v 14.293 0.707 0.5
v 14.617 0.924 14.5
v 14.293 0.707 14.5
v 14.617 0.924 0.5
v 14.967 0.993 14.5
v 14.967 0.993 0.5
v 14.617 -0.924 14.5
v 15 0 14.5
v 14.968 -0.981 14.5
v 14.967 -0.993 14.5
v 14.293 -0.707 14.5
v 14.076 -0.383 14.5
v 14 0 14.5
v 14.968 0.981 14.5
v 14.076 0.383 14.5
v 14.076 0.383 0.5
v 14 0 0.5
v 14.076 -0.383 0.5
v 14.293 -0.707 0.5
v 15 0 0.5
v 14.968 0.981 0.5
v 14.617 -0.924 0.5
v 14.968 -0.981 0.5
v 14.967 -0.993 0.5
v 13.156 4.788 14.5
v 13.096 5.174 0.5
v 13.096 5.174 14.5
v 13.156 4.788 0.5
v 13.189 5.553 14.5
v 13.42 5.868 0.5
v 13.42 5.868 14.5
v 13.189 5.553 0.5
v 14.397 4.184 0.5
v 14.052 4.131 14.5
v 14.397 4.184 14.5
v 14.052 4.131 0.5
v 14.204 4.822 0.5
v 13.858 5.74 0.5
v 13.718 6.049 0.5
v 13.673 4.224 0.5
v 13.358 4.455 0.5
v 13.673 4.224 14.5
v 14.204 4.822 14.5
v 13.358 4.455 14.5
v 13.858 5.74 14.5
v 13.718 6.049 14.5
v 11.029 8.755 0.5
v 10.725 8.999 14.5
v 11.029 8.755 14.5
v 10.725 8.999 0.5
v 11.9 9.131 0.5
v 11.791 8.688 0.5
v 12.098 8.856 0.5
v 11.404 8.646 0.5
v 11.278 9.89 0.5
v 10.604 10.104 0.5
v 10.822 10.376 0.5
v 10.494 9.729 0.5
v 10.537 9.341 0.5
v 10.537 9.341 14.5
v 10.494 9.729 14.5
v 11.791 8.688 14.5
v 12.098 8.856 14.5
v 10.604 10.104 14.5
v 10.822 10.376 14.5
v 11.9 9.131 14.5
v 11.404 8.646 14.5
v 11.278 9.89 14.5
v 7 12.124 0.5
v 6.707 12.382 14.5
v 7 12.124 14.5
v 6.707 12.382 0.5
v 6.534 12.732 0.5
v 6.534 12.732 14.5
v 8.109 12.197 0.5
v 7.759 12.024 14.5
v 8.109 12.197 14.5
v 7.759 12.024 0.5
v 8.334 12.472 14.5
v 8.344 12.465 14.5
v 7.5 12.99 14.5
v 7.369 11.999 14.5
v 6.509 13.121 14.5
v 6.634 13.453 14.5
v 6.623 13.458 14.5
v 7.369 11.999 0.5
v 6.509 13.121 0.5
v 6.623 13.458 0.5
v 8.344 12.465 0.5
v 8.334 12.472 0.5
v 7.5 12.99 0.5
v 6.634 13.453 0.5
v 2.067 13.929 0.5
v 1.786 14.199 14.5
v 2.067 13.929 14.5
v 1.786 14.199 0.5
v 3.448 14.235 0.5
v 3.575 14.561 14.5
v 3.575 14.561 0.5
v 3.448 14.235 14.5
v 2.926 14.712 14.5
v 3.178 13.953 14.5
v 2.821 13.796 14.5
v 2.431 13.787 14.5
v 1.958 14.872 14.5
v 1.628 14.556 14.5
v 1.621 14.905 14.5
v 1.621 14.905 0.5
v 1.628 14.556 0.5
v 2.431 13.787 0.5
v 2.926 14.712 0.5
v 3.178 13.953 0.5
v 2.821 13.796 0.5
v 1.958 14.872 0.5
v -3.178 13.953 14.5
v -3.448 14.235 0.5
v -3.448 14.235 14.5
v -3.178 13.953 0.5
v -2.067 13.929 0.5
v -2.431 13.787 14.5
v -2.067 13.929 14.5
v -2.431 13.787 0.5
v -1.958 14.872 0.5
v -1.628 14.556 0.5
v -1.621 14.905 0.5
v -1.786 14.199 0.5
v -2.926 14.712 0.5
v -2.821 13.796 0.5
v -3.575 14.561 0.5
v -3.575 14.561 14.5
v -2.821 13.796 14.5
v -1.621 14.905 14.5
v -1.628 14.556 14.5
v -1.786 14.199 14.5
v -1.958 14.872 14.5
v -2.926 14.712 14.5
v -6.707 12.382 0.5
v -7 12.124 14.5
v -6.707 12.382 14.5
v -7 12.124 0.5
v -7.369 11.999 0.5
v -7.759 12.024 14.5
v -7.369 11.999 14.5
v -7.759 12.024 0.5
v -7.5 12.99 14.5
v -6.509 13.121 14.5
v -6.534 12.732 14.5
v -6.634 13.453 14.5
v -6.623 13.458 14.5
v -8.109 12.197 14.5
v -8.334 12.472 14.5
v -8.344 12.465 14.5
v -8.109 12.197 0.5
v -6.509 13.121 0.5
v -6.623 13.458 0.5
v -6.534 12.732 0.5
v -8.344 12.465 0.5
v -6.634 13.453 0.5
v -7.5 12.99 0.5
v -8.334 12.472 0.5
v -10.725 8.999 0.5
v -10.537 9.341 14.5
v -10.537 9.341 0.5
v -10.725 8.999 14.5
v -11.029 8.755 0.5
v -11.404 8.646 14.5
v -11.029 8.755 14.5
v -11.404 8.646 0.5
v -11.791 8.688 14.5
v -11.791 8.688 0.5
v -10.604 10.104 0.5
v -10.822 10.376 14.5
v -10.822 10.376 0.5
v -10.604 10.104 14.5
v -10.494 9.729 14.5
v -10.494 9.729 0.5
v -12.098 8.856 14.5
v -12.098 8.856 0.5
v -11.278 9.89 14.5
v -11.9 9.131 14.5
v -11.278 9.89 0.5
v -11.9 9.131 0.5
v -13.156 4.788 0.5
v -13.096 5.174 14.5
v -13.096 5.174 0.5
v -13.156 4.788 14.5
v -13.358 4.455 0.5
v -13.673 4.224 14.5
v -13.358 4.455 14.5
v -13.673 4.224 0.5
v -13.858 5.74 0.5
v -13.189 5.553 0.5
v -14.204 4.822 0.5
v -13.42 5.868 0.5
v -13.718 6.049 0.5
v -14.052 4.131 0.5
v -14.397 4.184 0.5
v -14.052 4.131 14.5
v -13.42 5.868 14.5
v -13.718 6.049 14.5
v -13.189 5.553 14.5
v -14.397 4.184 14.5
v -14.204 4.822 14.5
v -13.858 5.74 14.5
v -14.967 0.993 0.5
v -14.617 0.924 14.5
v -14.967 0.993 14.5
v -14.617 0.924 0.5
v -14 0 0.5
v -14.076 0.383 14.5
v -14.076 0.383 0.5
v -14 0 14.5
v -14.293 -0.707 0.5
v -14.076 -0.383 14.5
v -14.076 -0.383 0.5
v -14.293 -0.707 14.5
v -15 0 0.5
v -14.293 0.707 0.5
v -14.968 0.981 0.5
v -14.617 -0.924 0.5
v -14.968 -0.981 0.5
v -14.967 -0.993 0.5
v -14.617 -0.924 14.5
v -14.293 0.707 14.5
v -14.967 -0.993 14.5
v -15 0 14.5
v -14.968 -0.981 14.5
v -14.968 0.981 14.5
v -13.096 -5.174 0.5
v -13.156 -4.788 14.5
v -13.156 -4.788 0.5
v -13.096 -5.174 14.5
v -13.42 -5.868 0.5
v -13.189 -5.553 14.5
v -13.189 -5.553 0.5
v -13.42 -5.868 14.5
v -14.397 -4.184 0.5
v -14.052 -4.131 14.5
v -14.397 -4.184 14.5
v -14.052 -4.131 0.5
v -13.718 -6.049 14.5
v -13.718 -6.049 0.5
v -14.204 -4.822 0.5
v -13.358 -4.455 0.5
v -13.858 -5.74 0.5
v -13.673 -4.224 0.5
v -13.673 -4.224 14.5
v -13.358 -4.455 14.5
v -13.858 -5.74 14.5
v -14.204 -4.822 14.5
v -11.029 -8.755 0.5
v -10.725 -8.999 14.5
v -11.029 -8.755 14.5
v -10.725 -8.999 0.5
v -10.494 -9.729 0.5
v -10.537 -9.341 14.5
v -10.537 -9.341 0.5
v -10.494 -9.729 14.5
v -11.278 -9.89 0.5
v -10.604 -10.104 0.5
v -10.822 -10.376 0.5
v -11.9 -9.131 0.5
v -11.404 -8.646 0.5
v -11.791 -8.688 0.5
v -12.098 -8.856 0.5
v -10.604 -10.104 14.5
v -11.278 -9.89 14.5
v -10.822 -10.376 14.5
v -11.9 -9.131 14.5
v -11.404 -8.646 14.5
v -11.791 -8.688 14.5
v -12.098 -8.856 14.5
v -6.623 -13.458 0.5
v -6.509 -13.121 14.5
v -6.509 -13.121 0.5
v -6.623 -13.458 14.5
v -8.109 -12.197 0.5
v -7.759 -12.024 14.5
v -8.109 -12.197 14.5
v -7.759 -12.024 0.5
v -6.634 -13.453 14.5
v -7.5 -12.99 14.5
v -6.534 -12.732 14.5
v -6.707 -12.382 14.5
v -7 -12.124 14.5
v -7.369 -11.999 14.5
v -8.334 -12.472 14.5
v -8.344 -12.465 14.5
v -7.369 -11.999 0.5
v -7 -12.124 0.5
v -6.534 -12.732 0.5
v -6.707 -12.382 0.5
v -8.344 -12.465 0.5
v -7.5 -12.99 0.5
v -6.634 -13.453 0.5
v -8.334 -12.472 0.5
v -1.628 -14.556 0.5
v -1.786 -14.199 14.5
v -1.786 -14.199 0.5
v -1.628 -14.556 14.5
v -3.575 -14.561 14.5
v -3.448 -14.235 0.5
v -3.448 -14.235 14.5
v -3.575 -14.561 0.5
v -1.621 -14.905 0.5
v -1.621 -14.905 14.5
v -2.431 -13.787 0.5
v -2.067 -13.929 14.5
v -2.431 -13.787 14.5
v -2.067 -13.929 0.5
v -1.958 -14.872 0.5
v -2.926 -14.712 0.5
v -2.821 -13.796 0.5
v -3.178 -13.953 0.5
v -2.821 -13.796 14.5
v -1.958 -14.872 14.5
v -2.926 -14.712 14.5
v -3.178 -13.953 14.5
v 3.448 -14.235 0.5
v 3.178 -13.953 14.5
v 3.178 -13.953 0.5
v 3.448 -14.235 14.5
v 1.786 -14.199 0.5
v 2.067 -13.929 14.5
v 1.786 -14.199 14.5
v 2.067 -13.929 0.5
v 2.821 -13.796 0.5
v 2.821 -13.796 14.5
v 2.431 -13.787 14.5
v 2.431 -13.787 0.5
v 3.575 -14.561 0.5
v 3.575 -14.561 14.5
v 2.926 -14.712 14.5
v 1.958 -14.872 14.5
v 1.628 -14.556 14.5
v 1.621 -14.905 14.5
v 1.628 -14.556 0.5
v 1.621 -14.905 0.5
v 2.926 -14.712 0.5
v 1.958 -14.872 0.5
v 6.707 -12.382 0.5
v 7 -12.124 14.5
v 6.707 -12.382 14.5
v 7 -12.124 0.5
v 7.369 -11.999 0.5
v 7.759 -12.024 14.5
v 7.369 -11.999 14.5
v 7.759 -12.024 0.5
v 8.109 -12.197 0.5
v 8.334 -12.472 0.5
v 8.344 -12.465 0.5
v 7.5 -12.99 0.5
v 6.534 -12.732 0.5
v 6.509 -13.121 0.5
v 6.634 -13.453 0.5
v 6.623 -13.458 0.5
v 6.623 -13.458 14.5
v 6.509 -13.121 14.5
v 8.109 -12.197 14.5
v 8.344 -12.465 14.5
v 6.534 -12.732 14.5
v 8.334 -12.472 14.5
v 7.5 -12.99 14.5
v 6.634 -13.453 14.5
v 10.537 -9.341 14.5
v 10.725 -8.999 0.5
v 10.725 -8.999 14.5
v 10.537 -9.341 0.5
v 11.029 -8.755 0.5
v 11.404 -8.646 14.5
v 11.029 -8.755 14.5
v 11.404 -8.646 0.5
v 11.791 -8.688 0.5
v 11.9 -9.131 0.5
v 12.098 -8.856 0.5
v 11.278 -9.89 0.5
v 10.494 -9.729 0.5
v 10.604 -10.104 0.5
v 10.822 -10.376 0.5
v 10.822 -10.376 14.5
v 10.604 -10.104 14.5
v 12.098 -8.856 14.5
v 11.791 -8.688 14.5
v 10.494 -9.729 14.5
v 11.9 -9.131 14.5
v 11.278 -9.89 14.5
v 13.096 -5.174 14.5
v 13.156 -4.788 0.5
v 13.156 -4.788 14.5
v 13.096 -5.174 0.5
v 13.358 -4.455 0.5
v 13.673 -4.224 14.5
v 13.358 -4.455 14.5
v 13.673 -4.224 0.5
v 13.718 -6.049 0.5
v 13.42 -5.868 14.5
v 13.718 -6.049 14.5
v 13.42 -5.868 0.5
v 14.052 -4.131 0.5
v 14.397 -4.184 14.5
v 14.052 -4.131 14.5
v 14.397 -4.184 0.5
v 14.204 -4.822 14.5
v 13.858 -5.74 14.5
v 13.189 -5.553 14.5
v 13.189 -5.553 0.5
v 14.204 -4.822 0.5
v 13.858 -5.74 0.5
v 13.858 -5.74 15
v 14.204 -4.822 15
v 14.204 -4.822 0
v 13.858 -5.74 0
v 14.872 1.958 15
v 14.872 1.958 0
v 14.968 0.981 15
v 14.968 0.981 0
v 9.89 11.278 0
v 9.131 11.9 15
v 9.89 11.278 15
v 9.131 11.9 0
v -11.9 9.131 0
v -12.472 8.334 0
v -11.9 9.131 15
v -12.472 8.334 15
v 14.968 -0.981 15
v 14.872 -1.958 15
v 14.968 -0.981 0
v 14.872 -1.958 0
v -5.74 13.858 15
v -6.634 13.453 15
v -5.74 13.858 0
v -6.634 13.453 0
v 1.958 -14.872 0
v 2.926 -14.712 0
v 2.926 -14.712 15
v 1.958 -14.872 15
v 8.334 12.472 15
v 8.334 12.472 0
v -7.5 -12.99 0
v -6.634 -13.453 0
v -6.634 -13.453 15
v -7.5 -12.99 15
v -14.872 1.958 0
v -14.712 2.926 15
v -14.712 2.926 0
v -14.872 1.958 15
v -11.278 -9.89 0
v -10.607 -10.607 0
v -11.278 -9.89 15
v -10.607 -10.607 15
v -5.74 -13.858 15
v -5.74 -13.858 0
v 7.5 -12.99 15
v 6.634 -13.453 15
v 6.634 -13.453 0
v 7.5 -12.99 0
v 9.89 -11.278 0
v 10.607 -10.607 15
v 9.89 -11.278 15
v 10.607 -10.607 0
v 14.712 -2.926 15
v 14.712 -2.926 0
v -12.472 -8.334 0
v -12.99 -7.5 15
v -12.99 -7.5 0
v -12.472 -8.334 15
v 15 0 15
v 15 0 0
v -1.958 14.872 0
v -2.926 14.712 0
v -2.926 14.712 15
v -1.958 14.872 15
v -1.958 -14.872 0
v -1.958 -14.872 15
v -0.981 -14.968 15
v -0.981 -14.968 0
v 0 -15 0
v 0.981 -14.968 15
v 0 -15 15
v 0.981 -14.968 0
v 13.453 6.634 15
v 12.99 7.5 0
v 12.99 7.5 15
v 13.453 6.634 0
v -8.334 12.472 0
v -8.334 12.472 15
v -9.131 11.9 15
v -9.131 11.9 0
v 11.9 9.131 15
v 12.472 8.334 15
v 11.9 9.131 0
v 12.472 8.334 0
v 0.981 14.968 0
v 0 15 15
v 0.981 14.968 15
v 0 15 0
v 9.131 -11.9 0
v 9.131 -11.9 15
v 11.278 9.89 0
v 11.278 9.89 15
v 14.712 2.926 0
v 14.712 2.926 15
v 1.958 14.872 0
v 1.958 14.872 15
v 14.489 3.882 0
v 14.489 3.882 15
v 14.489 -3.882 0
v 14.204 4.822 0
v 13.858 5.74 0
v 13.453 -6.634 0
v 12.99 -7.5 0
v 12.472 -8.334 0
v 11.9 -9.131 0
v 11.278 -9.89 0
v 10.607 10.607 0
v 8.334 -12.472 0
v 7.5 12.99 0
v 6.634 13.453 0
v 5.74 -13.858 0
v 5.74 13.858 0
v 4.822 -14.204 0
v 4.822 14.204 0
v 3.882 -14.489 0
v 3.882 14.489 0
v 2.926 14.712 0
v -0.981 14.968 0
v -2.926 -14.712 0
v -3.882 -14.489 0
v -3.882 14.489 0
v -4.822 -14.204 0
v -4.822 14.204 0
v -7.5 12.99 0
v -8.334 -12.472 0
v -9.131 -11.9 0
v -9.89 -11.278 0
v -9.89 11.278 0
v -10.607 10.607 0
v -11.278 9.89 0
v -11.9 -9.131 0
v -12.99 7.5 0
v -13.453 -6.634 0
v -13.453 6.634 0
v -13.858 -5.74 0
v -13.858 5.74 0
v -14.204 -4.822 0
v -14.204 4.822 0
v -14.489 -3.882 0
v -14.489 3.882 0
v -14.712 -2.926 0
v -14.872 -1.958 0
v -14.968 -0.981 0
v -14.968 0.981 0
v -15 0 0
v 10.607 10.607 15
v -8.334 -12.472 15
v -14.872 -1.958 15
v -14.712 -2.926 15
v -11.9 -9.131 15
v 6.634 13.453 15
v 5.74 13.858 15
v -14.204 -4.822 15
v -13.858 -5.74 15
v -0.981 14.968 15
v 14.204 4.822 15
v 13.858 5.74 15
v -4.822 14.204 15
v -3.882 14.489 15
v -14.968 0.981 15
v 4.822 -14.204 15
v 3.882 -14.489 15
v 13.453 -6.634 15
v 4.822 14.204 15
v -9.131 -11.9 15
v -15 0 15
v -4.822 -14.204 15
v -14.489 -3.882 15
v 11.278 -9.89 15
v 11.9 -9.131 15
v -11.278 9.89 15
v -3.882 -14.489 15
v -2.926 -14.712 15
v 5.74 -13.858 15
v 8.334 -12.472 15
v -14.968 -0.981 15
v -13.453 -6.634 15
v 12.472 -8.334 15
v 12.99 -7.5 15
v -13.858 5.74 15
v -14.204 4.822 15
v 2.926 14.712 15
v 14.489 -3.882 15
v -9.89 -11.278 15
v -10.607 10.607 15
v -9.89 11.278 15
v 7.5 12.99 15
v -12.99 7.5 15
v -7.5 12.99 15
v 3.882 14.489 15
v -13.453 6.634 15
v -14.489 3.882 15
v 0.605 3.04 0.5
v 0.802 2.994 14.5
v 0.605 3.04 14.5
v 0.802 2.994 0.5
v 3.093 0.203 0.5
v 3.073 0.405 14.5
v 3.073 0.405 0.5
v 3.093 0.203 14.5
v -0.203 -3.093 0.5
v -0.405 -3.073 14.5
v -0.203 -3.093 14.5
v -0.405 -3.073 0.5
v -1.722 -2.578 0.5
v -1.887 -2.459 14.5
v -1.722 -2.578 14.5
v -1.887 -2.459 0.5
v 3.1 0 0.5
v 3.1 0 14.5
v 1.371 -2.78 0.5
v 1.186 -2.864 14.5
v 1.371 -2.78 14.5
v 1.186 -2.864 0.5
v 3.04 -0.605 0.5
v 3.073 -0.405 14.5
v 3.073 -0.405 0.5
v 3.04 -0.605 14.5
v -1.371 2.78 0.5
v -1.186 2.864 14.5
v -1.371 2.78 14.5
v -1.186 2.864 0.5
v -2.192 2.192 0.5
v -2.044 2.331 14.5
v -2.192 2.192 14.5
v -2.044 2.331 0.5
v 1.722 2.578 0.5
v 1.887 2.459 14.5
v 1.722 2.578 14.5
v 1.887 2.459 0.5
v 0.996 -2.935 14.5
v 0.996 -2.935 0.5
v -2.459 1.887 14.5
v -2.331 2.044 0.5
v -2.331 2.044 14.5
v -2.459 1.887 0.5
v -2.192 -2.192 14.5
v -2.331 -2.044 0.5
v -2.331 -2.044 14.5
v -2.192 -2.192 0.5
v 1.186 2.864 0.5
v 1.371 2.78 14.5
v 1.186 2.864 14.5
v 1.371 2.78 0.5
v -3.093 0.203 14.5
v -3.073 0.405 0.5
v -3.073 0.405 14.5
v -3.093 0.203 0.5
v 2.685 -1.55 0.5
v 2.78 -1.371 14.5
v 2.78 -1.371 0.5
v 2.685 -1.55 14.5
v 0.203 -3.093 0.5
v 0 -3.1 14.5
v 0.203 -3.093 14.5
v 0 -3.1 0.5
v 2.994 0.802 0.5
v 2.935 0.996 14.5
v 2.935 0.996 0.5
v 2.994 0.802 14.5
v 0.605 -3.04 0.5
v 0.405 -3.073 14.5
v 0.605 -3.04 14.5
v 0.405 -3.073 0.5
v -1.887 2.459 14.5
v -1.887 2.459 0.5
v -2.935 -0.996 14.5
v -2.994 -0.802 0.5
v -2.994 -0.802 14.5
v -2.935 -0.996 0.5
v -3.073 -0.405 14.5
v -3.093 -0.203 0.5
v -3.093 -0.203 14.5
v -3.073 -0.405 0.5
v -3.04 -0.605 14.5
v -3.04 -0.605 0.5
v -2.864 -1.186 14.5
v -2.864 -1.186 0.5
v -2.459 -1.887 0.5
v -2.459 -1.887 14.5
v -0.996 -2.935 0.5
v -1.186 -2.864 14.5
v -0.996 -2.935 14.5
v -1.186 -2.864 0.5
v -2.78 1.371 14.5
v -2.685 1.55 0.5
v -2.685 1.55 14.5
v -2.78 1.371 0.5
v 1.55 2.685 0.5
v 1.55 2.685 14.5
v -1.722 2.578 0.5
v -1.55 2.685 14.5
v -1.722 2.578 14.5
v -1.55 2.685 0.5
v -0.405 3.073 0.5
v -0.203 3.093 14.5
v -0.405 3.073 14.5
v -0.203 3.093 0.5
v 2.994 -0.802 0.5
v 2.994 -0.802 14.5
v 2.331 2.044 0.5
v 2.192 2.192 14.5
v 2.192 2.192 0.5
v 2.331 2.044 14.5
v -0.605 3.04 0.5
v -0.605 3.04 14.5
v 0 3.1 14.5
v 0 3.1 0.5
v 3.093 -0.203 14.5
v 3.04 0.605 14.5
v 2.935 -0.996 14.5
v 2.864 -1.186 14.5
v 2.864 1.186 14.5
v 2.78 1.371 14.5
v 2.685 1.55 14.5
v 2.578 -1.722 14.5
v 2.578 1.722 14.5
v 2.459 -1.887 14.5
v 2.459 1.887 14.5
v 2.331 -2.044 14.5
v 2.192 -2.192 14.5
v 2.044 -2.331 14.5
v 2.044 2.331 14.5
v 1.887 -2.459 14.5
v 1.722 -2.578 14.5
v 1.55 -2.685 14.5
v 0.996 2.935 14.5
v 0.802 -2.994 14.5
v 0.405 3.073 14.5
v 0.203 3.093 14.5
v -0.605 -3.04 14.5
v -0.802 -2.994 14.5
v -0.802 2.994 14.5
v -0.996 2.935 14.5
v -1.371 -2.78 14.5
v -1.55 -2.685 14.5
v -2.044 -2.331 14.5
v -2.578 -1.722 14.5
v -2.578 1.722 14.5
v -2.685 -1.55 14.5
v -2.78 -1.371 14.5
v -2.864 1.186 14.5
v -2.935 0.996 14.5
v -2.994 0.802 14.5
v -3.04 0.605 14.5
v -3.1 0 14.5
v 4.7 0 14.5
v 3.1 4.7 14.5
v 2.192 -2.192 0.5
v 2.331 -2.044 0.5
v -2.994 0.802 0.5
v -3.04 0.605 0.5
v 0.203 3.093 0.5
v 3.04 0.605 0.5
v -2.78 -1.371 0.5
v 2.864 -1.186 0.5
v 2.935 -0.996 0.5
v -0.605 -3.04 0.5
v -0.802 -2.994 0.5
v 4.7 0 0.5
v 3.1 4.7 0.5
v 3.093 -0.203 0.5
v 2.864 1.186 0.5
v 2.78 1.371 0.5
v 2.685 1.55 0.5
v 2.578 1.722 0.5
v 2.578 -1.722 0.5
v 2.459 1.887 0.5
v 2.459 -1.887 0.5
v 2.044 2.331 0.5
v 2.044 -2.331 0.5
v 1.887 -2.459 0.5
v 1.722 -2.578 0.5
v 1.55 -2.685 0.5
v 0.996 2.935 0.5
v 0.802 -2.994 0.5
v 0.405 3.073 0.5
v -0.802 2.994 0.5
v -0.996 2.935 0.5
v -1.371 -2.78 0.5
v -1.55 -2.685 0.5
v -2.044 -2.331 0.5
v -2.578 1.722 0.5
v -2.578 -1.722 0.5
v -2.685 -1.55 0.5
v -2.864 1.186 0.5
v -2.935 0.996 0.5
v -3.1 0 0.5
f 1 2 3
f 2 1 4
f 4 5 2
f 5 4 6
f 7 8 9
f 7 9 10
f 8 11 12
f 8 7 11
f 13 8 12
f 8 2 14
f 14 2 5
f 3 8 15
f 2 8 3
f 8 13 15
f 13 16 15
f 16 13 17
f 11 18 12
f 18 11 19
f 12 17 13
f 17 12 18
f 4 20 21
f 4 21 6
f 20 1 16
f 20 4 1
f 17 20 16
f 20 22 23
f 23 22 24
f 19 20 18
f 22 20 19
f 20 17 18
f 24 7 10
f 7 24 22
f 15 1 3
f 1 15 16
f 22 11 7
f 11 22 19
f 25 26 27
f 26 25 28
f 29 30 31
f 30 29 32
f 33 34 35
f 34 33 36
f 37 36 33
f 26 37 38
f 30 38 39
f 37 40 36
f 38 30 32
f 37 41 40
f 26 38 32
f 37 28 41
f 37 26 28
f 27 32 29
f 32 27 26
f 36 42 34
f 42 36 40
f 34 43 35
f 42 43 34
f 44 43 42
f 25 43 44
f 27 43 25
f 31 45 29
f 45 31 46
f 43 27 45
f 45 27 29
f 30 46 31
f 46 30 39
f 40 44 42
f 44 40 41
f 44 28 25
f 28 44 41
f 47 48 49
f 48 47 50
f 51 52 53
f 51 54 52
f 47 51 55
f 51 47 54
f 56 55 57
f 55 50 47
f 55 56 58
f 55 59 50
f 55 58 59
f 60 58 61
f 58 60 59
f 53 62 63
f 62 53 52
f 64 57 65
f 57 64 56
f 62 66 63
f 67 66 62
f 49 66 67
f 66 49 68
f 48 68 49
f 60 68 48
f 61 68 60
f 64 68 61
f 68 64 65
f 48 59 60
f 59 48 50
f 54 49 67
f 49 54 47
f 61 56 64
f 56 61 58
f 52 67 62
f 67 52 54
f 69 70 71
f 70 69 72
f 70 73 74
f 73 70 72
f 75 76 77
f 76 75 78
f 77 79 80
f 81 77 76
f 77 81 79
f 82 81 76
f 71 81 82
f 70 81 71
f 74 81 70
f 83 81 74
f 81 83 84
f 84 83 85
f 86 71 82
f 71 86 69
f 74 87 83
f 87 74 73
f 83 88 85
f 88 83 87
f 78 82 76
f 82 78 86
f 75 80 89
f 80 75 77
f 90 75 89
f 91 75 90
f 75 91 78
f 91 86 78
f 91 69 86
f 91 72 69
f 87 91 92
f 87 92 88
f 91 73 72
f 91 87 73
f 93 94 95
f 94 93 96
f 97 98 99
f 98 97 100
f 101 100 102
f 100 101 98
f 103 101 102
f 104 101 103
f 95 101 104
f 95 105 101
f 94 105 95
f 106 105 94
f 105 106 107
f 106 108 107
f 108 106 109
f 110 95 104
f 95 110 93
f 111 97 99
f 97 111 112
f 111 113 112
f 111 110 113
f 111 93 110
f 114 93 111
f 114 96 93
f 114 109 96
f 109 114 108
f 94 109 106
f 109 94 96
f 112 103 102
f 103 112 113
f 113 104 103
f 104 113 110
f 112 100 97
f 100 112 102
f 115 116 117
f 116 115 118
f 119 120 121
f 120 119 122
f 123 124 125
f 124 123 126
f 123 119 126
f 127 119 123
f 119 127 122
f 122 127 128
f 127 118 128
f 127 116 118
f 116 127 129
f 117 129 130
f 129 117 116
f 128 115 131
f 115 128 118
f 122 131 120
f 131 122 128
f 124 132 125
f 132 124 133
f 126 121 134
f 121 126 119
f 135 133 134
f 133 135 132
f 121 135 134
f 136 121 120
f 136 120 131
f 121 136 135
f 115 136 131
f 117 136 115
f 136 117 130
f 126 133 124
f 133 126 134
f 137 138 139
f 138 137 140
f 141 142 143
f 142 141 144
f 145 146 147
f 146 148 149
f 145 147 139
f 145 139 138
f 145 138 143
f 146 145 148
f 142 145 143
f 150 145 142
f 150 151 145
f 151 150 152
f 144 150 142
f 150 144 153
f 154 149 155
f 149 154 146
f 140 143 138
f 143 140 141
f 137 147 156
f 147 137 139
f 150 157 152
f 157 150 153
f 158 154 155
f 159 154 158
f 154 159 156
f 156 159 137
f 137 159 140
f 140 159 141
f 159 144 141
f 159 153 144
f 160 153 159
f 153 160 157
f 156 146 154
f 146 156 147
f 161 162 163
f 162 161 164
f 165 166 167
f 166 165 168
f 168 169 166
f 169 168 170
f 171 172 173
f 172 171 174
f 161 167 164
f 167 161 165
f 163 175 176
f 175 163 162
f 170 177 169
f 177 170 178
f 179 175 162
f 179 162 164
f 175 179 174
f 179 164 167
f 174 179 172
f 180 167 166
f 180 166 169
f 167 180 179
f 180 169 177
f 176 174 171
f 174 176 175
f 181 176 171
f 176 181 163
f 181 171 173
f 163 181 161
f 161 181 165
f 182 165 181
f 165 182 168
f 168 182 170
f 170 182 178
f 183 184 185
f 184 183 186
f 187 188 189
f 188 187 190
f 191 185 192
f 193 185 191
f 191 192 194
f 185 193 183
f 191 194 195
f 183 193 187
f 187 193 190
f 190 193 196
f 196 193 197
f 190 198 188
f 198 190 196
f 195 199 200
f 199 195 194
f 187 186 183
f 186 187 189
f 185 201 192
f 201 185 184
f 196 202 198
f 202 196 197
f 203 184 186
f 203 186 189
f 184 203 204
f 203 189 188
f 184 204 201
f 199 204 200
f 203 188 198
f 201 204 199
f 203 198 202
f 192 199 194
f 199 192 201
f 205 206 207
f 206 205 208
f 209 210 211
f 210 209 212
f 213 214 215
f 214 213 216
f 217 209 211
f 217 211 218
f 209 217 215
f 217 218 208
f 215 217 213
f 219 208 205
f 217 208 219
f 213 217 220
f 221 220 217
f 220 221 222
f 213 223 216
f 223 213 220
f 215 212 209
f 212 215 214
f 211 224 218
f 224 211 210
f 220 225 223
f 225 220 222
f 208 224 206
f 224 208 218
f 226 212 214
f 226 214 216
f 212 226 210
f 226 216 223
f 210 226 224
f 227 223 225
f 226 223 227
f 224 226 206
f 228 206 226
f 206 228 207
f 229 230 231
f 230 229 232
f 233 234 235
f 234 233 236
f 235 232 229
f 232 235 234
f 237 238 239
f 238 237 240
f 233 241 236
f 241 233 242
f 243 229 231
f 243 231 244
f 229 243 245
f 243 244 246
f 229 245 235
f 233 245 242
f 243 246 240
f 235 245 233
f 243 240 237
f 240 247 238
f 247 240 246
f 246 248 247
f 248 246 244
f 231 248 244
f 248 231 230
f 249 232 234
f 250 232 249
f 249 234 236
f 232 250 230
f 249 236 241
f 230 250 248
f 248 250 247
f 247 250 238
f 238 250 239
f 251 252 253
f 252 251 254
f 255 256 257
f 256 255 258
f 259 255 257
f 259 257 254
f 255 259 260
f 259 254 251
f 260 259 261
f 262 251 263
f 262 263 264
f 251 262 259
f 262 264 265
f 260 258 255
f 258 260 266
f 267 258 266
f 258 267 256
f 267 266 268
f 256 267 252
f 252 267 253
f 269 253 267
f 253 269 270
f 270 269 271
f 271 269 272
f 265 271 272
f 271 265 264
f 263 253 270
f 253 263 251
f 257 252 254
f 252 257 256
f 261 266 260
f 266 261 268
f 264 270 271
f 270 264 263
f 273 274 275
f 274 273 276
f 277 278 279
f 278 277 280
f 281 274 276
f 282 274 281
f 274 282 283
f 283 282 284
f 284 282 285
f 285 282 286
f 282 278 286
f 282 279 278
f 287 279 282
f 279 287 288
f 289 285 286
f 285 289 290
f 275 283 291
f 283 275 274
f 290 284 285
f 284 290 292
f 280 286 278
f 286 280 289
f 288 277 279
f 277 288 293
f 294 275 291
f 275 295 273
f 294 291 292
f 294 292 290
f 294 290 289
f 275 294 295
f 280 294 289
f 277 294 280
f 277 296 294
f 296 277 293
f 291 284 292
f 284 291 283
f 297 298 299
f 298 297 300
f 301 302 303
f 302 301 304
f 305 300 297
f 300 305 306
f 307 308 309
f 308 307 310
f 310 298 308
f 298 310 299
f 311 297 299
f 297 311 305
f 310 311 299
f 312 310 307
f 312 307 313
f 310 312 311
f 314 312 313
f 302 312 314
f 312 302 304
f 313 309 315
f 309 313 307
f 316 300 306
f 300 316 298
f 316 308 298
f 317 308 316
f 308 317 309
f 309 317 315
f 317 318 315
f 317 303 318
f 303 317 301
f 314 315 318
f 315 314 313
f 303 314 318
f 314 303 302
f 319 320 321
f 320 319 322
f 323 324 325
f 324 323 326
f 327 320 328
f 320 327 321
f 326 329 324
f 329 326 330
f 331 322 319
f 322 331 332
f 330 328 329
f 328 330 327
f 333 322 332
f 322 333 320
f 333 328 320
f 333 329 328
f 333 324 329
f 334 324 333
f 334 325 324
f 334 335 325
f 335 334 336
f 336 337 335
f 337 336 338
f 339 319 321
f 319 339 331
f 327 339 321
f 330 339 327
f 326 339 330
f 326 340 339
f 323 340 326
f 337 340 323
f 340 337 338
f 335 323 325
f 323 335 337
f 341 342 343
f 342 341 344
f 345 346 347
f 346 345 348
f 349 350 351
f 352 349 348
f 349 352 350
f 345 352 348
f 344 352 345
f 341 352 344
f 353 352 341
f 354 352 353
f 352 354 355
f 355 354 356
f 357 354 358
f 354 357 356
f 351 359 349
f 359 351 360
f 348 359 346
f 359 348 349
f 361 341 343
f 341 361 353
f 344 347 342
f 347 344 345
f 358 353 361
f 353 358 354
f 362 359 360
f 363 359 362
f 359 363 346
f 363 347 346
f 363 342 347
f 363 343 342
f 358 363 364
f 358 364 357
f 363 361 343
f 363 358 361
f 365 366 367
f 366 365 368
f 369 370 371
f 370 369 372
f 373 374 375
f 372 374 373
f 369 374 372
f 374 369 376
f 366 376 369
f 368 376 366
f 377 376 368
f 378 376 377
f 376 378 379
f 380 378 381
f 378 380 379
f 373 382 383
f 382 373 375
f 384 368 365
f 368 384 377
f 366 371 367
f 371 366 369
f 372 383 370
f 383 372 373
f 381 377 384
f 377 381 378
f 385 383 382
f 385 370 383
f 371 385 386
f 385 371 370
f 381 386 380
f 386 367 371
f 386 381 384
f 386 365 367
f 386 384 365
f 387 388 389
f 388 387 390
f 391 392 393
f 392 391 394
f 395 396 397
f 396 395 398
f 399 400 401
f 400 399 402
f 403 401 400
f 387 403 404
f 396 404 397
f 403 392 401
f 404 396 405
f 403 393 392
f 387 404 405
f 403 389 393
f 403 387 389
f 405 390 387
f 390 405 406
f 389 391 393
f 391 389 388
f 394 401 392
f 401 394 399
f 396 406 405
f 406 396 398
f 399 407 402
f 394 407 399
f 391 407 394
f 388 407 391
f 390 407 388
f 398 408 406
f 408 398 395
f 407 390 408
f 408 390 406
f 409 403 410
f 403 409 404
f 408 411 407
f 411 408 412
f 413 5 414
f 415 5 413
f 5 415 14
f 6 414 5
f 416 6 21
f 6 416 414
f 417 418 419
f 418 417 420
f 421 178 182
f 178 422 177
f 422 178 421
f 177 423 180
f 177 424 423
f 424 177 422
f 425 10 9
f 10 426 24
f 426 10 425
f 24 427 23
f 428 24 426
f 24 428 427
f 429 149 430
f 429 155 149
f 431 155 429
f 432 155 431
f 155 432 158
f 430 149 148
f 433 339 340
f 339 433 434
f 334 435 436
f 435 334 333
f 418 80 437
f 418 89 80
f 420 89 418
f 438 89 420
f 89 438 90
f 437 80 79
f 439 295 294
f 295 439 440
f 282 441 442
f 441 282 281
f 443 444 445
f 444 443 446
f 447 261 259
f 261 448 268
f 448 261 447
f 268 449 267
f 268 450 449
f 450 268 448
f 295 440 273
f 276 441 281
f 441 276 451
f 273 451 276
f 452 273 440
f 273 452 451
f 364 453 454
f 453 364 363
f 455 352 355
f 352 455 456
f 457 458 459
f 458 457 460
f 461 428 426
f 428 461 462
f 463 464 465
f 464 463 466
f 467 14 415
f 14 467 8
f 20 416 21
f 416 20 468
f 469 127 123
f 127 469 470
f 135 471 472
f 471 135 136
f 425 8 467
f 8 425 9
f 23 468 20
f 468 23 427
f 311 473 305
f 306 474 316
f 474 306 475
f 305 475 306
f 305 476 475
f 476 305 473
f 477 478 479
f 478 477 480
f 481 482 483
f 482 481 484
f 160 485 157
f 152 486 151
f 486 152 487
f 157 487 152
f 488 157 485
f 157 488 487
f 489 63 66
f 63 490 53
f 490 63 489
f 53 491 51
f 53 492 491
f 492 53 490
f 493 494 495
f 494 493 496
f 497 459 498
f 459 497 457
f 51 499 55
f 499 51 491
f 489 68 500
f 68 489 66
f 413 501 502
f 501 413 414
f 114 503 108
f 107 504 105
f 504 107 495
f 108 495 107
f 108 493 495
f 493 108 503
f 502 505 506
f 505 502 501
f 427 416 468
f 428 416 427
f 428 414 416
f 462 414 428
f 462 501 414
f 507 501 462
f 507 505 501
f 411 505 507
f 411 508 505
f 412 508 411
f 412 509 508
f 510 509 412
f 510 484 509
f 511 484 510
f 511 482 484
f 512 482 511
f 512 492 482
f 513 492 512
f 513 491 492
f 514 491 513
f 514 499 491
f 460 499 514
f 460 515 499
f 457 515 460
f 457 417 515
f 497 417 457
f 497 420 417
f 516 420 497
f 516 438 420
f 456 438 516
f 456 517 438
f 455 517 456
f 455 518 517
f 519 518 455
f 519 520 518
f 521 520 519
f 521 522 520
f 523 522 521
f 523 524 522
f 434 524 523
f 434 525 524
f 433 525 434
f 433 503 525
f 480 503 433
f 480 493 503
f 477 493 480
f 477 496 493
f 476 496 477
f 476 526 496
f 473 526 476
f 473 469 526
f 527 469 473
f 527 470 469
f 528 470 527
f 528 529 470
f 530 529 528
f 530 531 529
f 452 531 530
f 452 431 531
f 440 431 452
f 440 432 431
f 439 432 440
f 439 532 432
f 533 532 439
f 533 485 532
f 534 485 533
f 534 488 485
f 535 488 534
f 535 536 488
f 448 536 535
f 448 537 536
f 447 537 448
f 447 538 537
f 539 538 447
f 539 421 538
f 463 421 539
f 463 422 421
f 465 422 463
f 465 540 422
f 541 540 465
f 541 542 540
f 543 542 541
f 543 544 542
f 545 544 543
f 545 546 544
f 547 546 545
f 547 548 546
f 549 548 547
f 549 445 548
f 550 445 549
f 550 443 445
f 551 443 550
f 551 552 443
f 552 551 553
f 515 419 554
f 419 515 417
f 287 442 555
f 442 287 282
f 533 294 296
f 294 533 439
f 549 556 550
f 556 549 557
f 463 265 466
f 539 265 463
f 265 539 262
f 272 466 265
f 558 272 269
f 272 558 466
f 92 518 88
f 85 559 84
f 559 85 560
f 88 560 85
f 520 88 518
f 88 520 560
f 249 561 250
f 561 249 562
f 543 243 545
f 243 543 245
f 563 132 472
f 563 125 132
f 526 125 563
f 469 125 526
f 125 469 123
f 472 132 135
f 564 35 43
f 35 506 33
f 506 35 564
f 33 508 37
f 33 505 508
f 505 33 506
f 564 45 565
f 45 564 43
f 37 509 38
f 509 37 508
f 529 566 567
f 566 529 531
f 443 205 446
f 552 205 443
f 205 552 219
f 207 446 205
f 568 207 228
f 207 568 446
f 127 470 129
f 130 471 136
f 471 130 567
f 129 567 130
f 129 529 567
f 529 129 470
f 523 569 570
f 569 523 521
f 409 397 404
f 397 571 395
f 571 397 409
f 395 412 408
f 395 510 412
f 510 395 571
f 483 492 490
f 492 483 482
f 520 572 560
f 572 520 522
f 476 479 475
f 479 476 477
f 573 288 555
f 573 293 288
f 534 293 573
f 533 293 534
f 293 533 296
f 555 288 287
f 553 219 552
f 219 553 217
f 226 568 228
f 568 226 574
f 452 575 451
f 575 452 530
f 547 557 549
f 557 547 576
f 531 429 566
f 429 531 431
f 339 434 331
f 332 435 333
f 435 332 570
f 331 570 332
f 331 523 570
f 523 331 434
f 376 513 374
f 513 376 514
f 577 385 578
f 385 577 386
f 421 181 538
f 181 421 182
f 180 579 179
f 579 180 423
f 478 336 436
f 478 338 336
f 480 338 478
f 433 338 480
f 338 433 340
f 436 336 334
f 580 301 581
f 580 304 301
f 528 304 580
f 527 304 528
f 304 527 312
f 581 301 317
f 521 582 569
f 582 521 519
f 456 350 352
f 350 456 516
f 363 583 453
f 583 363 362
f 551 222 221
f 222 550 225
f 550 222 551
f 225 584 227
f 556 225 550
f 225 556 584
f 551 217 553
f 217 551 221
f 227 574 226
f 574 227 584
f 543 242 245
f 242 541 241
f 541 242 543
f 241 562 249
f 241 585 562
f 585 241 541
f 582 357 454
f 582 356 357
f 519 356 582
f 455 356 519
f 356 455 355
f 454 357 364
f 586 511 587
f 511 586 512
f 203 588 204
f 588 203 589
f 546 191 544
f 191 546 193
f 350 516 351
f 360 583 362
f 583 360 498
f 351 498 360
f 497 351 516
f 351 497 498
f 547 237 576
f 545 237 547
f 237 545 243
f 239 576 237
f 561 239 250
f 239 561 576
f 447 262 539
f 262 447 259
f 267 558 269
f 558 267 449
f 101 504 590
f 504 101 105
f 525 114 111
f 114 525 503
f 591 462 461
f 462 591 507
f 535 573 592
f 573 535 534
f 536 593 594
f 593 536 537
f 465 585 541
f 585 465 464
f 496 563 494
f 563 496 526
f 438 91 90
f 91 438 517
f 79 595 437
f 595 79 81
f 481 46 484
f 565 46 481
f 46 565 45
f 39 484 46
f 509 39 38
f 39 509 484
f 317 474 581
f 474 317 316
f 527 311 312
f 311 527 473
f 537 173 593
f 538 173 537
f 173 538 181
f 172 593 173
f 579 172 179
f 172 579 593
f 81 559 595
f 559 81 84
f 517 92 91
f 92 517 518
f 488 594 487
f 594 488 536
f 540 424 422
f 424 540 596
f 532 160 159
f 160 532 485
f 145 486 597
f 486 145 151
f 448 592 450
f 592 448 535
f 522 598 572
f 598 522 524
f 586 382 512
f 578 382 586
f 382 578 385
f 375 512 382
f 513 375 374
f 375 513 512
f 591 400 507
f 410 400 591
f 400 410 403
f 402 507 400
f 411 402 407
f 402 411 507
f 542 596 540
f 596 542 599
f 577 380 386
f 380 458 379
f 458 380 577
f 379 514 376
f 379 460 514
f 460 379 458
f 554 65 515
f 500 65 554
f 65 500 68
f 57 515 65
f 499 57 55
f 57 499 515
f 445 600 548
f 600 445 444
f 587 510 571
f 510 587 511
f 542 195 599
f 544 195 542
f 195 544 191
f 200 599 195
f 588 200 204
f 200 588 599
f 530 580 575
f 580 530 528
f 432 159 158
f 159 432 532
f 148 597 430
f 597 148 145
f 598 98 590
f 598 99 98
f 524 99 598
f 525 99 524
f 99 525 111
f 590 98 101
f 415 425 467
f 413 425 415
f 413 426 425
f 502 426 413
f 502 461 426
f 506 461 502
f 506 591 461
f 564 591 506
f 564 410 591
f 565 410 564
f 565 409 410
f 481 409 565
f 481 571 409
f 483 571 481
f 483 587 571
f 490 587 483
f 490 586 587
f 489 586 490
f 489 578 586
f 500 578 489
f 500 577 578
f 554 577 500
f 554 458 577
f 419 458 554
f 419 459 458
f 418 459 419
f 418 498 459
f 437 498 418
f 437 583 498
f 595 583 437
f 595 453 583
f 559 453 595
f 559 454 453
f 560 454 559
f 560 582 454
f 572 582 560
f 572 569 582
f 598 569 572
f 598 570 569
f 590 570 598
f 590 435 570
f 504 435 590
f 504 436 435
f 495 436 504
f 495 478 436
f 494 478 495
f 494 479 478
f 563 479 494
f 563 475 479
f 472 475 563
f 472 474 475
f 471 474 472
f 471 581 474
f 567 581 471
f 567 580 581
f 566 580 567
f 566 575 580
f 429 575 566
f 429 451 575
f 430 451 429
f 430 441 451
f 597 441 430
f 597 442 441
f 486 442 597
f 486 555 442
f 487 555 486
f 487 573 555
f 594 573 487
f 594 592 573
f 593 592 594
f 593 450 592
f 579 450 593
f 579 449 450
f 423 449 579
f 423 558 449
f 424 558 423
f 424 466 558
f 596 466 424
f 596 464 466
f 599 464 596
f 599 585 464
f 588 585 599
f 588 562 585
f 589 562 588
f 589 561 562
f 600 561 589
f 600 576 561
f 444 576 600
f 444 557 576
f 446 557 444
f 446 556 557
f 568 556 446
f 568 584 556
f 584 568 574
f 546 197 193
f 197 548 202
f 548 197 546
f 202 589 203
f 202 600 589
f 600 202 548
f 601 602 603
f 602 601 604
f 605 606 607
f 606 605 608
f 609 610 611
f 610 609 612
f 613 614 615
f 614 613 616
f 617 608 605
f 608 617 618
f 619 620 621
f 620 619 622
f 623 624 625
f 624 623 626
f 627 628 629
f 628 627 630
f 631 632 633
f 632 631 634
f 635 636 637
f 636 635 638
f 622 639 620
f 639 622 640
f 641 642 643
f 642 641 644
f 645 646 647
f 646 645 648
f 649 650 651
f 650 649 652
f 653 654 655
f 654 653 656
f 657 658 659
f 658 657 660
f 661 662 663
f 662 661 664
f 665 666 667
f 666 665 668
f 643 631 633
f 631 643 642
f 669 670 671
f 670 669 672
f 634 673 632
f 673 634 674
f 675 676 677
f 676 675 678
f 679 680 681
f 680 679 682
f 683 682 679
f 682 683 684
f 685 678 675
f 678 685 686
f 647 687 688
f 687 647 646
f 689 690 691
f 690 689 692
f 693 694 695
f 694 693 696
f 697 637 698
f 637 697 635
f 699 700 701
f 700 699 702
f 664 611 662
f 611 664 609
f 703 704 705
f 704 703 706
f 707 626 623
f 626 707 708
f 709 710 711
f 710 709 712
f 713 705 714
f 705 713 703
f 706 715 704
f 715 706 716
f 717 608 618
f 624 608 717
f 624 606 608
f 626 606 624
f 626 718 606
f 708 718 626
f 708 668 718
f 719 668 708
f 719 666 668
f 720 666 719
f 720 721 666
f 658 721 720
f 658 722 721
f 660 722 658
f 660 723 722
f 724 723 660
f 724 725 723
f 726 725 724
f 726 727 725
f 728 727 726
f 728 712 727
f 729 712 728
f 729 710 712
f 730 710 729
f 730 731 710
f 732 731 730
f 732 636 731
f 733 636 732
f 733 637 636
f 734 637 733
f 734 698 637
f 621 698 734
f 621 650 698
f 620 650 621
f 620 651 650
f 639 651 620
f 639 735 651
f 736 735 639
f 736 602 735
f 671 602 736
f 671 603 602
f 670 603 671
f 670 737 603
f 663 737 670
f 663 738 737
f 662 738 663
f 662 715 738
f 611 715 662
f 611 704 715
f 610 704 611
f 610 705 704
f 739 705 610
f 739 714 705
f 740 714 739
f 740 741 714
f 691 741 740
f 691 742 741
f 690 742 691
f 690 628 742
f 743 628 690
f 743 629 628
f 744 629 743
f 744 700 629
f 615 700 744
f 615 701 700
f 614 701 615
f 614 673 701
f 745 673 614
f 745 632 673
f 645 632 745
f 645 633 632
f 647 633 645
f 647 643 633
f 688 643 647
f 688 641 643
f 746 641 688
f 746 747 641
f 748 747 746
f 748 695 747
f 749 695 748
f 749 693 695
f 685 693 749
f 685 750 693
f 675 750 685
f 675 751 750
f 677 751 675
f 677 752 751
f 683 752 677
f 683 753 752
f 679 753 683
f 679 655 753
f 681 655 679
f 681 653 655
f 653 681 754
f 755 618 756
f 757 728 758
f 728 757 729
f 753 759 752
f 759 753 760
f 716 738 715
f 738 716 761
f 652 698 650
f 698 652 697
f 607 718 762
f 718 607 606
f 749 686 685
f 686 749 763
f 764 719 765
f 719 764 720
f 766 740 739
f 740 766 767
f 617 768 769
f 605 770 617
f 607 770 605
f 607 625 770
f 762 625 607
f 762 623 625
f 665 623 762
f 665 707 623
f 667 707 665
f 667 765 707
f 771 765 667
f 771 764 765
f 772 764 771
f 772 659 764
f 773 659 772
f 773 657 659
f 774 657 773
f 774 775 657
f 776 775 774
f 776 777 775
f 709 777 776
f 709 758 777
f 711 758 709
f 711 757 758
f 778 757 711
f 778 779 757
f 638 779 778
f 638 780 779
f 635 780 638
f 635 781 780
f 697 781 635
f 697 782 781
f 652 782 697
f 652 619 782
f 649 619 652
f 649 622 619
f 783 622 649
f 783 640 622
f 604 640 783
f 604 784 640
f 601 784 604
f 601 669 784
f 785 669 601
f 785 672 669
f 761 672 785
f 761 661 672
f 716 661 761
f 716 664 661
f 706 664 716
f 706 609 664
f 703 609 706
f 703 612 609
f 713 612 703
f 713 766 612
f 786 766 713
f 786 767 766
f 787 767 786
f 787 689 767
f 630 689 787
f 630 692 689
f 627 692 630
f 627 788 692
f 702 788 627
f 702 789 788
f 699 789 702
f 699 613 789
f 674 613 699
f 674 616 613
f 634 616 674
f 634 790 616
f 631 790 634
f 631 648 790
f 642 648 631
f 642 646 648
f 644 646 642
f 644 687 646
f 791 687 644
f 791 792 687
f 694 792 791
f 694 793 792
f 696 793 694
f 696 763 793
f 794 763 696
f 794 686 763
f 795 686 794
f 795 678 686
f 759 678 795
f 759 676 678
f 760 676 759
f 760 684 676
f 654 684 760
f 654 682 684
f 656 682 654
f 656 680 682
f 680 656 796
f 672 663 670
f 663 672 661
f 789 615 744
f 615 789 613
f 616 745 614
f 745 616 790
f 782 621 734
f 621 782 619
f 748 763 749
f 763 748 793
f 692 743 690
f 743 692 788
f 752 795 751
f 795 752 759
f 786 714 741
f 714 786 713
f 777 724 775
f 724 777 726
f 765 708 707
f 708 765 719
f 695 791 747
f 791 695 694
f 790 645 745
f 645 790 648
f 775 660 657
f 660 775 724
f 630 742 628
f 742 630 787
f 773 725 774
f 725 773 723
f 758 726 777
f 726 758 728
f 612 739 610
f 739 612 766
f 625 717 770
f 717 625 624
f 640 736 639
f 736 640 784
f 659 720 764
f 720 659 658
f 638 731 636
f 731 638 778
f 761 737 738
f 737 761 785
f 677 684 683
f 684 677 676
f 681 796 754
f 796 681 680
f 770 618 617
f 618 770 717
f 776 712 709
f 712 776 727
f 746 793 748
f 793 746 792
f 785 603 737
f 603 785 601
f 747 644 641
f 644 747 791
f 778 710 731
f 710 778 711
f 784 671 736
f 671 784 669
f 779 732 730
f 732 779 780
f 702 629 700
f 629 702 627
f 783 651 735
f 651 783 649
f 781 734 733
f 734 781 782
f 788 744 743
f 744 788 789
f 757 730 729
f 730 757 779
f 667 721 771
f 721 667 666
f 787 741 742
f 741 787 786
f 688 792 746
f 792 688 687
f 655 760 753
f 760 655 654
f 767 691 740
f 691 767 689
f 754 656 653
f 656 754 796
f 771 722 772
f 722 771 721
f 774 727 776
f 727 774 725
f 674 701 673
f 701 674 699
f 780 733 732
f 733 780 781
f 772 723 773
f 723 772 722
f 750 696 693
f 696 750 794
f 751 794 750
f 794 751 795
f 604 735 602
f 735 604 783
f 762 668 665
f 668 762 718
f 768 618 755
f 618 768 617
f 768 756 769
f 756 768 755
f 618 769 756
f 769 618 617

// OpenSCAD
// Replacement knob for a hotplate stirrer with a 6 mm D-shaft
// Print orientation: bottom face (with D-bore) on the bed, z = 0

// ---------------- Parameters ----------------
knob_d        = 30;    // knob outer diameter
knob_h        = 15;    // knob height
shaft_d       = 6.2;   // D-shaft bore diameter
shaft_flat    = 4.7;   // distance from D-flat to opposite side of circle
groove_count  = 18;    // number of vertical grip grooves
groove_d      = 2;     // groove diameter (half-cylinder)
pointer_w     = 1.5;   // pointer groove width
pointer_d     = 1;     // pointer groove depth
eps           = 0.5;   // overcut for clean differences

$fn = 96;

// ---------------- Model ----------------
difference() {
    // Main body
    cylinder(d = knob_d, h = knob_h);

    // D-shaped blind bore from the bottom face
    translate([0, 0, eps])
        linear_extrude(height = knob_h - 2 * eps)
            circle(d = shaft_d);
    // Cut the flat side of the D
    translate([0, 0, eps])
        linear_extrude(height = knob_h - 2 * eps)
            polygon([
                [shaft_d / 2, 0],
                [shaft_flat, 0],
                [shaft_d / 2, shaft_flat]
            ]);

    // Vertical grip grooves around the outside, full height
    for (i = [0 : groove_count - 1])
        rotate([0, 0, i * 360 / groove_count])
            translate([knob_d / 2, 0, eps])
                cylinder(d = groove_d, h = knob_h - 2 * eps, $fn = 16);

    // Pointer groove from the centre to the outer edge on the top face
    translate([0, 0, knob_h - pointer_d])
        rotate([90, 0, 0])
            linear_extrude(height = pointer_w)
                circle(d = pointer_d);
}
